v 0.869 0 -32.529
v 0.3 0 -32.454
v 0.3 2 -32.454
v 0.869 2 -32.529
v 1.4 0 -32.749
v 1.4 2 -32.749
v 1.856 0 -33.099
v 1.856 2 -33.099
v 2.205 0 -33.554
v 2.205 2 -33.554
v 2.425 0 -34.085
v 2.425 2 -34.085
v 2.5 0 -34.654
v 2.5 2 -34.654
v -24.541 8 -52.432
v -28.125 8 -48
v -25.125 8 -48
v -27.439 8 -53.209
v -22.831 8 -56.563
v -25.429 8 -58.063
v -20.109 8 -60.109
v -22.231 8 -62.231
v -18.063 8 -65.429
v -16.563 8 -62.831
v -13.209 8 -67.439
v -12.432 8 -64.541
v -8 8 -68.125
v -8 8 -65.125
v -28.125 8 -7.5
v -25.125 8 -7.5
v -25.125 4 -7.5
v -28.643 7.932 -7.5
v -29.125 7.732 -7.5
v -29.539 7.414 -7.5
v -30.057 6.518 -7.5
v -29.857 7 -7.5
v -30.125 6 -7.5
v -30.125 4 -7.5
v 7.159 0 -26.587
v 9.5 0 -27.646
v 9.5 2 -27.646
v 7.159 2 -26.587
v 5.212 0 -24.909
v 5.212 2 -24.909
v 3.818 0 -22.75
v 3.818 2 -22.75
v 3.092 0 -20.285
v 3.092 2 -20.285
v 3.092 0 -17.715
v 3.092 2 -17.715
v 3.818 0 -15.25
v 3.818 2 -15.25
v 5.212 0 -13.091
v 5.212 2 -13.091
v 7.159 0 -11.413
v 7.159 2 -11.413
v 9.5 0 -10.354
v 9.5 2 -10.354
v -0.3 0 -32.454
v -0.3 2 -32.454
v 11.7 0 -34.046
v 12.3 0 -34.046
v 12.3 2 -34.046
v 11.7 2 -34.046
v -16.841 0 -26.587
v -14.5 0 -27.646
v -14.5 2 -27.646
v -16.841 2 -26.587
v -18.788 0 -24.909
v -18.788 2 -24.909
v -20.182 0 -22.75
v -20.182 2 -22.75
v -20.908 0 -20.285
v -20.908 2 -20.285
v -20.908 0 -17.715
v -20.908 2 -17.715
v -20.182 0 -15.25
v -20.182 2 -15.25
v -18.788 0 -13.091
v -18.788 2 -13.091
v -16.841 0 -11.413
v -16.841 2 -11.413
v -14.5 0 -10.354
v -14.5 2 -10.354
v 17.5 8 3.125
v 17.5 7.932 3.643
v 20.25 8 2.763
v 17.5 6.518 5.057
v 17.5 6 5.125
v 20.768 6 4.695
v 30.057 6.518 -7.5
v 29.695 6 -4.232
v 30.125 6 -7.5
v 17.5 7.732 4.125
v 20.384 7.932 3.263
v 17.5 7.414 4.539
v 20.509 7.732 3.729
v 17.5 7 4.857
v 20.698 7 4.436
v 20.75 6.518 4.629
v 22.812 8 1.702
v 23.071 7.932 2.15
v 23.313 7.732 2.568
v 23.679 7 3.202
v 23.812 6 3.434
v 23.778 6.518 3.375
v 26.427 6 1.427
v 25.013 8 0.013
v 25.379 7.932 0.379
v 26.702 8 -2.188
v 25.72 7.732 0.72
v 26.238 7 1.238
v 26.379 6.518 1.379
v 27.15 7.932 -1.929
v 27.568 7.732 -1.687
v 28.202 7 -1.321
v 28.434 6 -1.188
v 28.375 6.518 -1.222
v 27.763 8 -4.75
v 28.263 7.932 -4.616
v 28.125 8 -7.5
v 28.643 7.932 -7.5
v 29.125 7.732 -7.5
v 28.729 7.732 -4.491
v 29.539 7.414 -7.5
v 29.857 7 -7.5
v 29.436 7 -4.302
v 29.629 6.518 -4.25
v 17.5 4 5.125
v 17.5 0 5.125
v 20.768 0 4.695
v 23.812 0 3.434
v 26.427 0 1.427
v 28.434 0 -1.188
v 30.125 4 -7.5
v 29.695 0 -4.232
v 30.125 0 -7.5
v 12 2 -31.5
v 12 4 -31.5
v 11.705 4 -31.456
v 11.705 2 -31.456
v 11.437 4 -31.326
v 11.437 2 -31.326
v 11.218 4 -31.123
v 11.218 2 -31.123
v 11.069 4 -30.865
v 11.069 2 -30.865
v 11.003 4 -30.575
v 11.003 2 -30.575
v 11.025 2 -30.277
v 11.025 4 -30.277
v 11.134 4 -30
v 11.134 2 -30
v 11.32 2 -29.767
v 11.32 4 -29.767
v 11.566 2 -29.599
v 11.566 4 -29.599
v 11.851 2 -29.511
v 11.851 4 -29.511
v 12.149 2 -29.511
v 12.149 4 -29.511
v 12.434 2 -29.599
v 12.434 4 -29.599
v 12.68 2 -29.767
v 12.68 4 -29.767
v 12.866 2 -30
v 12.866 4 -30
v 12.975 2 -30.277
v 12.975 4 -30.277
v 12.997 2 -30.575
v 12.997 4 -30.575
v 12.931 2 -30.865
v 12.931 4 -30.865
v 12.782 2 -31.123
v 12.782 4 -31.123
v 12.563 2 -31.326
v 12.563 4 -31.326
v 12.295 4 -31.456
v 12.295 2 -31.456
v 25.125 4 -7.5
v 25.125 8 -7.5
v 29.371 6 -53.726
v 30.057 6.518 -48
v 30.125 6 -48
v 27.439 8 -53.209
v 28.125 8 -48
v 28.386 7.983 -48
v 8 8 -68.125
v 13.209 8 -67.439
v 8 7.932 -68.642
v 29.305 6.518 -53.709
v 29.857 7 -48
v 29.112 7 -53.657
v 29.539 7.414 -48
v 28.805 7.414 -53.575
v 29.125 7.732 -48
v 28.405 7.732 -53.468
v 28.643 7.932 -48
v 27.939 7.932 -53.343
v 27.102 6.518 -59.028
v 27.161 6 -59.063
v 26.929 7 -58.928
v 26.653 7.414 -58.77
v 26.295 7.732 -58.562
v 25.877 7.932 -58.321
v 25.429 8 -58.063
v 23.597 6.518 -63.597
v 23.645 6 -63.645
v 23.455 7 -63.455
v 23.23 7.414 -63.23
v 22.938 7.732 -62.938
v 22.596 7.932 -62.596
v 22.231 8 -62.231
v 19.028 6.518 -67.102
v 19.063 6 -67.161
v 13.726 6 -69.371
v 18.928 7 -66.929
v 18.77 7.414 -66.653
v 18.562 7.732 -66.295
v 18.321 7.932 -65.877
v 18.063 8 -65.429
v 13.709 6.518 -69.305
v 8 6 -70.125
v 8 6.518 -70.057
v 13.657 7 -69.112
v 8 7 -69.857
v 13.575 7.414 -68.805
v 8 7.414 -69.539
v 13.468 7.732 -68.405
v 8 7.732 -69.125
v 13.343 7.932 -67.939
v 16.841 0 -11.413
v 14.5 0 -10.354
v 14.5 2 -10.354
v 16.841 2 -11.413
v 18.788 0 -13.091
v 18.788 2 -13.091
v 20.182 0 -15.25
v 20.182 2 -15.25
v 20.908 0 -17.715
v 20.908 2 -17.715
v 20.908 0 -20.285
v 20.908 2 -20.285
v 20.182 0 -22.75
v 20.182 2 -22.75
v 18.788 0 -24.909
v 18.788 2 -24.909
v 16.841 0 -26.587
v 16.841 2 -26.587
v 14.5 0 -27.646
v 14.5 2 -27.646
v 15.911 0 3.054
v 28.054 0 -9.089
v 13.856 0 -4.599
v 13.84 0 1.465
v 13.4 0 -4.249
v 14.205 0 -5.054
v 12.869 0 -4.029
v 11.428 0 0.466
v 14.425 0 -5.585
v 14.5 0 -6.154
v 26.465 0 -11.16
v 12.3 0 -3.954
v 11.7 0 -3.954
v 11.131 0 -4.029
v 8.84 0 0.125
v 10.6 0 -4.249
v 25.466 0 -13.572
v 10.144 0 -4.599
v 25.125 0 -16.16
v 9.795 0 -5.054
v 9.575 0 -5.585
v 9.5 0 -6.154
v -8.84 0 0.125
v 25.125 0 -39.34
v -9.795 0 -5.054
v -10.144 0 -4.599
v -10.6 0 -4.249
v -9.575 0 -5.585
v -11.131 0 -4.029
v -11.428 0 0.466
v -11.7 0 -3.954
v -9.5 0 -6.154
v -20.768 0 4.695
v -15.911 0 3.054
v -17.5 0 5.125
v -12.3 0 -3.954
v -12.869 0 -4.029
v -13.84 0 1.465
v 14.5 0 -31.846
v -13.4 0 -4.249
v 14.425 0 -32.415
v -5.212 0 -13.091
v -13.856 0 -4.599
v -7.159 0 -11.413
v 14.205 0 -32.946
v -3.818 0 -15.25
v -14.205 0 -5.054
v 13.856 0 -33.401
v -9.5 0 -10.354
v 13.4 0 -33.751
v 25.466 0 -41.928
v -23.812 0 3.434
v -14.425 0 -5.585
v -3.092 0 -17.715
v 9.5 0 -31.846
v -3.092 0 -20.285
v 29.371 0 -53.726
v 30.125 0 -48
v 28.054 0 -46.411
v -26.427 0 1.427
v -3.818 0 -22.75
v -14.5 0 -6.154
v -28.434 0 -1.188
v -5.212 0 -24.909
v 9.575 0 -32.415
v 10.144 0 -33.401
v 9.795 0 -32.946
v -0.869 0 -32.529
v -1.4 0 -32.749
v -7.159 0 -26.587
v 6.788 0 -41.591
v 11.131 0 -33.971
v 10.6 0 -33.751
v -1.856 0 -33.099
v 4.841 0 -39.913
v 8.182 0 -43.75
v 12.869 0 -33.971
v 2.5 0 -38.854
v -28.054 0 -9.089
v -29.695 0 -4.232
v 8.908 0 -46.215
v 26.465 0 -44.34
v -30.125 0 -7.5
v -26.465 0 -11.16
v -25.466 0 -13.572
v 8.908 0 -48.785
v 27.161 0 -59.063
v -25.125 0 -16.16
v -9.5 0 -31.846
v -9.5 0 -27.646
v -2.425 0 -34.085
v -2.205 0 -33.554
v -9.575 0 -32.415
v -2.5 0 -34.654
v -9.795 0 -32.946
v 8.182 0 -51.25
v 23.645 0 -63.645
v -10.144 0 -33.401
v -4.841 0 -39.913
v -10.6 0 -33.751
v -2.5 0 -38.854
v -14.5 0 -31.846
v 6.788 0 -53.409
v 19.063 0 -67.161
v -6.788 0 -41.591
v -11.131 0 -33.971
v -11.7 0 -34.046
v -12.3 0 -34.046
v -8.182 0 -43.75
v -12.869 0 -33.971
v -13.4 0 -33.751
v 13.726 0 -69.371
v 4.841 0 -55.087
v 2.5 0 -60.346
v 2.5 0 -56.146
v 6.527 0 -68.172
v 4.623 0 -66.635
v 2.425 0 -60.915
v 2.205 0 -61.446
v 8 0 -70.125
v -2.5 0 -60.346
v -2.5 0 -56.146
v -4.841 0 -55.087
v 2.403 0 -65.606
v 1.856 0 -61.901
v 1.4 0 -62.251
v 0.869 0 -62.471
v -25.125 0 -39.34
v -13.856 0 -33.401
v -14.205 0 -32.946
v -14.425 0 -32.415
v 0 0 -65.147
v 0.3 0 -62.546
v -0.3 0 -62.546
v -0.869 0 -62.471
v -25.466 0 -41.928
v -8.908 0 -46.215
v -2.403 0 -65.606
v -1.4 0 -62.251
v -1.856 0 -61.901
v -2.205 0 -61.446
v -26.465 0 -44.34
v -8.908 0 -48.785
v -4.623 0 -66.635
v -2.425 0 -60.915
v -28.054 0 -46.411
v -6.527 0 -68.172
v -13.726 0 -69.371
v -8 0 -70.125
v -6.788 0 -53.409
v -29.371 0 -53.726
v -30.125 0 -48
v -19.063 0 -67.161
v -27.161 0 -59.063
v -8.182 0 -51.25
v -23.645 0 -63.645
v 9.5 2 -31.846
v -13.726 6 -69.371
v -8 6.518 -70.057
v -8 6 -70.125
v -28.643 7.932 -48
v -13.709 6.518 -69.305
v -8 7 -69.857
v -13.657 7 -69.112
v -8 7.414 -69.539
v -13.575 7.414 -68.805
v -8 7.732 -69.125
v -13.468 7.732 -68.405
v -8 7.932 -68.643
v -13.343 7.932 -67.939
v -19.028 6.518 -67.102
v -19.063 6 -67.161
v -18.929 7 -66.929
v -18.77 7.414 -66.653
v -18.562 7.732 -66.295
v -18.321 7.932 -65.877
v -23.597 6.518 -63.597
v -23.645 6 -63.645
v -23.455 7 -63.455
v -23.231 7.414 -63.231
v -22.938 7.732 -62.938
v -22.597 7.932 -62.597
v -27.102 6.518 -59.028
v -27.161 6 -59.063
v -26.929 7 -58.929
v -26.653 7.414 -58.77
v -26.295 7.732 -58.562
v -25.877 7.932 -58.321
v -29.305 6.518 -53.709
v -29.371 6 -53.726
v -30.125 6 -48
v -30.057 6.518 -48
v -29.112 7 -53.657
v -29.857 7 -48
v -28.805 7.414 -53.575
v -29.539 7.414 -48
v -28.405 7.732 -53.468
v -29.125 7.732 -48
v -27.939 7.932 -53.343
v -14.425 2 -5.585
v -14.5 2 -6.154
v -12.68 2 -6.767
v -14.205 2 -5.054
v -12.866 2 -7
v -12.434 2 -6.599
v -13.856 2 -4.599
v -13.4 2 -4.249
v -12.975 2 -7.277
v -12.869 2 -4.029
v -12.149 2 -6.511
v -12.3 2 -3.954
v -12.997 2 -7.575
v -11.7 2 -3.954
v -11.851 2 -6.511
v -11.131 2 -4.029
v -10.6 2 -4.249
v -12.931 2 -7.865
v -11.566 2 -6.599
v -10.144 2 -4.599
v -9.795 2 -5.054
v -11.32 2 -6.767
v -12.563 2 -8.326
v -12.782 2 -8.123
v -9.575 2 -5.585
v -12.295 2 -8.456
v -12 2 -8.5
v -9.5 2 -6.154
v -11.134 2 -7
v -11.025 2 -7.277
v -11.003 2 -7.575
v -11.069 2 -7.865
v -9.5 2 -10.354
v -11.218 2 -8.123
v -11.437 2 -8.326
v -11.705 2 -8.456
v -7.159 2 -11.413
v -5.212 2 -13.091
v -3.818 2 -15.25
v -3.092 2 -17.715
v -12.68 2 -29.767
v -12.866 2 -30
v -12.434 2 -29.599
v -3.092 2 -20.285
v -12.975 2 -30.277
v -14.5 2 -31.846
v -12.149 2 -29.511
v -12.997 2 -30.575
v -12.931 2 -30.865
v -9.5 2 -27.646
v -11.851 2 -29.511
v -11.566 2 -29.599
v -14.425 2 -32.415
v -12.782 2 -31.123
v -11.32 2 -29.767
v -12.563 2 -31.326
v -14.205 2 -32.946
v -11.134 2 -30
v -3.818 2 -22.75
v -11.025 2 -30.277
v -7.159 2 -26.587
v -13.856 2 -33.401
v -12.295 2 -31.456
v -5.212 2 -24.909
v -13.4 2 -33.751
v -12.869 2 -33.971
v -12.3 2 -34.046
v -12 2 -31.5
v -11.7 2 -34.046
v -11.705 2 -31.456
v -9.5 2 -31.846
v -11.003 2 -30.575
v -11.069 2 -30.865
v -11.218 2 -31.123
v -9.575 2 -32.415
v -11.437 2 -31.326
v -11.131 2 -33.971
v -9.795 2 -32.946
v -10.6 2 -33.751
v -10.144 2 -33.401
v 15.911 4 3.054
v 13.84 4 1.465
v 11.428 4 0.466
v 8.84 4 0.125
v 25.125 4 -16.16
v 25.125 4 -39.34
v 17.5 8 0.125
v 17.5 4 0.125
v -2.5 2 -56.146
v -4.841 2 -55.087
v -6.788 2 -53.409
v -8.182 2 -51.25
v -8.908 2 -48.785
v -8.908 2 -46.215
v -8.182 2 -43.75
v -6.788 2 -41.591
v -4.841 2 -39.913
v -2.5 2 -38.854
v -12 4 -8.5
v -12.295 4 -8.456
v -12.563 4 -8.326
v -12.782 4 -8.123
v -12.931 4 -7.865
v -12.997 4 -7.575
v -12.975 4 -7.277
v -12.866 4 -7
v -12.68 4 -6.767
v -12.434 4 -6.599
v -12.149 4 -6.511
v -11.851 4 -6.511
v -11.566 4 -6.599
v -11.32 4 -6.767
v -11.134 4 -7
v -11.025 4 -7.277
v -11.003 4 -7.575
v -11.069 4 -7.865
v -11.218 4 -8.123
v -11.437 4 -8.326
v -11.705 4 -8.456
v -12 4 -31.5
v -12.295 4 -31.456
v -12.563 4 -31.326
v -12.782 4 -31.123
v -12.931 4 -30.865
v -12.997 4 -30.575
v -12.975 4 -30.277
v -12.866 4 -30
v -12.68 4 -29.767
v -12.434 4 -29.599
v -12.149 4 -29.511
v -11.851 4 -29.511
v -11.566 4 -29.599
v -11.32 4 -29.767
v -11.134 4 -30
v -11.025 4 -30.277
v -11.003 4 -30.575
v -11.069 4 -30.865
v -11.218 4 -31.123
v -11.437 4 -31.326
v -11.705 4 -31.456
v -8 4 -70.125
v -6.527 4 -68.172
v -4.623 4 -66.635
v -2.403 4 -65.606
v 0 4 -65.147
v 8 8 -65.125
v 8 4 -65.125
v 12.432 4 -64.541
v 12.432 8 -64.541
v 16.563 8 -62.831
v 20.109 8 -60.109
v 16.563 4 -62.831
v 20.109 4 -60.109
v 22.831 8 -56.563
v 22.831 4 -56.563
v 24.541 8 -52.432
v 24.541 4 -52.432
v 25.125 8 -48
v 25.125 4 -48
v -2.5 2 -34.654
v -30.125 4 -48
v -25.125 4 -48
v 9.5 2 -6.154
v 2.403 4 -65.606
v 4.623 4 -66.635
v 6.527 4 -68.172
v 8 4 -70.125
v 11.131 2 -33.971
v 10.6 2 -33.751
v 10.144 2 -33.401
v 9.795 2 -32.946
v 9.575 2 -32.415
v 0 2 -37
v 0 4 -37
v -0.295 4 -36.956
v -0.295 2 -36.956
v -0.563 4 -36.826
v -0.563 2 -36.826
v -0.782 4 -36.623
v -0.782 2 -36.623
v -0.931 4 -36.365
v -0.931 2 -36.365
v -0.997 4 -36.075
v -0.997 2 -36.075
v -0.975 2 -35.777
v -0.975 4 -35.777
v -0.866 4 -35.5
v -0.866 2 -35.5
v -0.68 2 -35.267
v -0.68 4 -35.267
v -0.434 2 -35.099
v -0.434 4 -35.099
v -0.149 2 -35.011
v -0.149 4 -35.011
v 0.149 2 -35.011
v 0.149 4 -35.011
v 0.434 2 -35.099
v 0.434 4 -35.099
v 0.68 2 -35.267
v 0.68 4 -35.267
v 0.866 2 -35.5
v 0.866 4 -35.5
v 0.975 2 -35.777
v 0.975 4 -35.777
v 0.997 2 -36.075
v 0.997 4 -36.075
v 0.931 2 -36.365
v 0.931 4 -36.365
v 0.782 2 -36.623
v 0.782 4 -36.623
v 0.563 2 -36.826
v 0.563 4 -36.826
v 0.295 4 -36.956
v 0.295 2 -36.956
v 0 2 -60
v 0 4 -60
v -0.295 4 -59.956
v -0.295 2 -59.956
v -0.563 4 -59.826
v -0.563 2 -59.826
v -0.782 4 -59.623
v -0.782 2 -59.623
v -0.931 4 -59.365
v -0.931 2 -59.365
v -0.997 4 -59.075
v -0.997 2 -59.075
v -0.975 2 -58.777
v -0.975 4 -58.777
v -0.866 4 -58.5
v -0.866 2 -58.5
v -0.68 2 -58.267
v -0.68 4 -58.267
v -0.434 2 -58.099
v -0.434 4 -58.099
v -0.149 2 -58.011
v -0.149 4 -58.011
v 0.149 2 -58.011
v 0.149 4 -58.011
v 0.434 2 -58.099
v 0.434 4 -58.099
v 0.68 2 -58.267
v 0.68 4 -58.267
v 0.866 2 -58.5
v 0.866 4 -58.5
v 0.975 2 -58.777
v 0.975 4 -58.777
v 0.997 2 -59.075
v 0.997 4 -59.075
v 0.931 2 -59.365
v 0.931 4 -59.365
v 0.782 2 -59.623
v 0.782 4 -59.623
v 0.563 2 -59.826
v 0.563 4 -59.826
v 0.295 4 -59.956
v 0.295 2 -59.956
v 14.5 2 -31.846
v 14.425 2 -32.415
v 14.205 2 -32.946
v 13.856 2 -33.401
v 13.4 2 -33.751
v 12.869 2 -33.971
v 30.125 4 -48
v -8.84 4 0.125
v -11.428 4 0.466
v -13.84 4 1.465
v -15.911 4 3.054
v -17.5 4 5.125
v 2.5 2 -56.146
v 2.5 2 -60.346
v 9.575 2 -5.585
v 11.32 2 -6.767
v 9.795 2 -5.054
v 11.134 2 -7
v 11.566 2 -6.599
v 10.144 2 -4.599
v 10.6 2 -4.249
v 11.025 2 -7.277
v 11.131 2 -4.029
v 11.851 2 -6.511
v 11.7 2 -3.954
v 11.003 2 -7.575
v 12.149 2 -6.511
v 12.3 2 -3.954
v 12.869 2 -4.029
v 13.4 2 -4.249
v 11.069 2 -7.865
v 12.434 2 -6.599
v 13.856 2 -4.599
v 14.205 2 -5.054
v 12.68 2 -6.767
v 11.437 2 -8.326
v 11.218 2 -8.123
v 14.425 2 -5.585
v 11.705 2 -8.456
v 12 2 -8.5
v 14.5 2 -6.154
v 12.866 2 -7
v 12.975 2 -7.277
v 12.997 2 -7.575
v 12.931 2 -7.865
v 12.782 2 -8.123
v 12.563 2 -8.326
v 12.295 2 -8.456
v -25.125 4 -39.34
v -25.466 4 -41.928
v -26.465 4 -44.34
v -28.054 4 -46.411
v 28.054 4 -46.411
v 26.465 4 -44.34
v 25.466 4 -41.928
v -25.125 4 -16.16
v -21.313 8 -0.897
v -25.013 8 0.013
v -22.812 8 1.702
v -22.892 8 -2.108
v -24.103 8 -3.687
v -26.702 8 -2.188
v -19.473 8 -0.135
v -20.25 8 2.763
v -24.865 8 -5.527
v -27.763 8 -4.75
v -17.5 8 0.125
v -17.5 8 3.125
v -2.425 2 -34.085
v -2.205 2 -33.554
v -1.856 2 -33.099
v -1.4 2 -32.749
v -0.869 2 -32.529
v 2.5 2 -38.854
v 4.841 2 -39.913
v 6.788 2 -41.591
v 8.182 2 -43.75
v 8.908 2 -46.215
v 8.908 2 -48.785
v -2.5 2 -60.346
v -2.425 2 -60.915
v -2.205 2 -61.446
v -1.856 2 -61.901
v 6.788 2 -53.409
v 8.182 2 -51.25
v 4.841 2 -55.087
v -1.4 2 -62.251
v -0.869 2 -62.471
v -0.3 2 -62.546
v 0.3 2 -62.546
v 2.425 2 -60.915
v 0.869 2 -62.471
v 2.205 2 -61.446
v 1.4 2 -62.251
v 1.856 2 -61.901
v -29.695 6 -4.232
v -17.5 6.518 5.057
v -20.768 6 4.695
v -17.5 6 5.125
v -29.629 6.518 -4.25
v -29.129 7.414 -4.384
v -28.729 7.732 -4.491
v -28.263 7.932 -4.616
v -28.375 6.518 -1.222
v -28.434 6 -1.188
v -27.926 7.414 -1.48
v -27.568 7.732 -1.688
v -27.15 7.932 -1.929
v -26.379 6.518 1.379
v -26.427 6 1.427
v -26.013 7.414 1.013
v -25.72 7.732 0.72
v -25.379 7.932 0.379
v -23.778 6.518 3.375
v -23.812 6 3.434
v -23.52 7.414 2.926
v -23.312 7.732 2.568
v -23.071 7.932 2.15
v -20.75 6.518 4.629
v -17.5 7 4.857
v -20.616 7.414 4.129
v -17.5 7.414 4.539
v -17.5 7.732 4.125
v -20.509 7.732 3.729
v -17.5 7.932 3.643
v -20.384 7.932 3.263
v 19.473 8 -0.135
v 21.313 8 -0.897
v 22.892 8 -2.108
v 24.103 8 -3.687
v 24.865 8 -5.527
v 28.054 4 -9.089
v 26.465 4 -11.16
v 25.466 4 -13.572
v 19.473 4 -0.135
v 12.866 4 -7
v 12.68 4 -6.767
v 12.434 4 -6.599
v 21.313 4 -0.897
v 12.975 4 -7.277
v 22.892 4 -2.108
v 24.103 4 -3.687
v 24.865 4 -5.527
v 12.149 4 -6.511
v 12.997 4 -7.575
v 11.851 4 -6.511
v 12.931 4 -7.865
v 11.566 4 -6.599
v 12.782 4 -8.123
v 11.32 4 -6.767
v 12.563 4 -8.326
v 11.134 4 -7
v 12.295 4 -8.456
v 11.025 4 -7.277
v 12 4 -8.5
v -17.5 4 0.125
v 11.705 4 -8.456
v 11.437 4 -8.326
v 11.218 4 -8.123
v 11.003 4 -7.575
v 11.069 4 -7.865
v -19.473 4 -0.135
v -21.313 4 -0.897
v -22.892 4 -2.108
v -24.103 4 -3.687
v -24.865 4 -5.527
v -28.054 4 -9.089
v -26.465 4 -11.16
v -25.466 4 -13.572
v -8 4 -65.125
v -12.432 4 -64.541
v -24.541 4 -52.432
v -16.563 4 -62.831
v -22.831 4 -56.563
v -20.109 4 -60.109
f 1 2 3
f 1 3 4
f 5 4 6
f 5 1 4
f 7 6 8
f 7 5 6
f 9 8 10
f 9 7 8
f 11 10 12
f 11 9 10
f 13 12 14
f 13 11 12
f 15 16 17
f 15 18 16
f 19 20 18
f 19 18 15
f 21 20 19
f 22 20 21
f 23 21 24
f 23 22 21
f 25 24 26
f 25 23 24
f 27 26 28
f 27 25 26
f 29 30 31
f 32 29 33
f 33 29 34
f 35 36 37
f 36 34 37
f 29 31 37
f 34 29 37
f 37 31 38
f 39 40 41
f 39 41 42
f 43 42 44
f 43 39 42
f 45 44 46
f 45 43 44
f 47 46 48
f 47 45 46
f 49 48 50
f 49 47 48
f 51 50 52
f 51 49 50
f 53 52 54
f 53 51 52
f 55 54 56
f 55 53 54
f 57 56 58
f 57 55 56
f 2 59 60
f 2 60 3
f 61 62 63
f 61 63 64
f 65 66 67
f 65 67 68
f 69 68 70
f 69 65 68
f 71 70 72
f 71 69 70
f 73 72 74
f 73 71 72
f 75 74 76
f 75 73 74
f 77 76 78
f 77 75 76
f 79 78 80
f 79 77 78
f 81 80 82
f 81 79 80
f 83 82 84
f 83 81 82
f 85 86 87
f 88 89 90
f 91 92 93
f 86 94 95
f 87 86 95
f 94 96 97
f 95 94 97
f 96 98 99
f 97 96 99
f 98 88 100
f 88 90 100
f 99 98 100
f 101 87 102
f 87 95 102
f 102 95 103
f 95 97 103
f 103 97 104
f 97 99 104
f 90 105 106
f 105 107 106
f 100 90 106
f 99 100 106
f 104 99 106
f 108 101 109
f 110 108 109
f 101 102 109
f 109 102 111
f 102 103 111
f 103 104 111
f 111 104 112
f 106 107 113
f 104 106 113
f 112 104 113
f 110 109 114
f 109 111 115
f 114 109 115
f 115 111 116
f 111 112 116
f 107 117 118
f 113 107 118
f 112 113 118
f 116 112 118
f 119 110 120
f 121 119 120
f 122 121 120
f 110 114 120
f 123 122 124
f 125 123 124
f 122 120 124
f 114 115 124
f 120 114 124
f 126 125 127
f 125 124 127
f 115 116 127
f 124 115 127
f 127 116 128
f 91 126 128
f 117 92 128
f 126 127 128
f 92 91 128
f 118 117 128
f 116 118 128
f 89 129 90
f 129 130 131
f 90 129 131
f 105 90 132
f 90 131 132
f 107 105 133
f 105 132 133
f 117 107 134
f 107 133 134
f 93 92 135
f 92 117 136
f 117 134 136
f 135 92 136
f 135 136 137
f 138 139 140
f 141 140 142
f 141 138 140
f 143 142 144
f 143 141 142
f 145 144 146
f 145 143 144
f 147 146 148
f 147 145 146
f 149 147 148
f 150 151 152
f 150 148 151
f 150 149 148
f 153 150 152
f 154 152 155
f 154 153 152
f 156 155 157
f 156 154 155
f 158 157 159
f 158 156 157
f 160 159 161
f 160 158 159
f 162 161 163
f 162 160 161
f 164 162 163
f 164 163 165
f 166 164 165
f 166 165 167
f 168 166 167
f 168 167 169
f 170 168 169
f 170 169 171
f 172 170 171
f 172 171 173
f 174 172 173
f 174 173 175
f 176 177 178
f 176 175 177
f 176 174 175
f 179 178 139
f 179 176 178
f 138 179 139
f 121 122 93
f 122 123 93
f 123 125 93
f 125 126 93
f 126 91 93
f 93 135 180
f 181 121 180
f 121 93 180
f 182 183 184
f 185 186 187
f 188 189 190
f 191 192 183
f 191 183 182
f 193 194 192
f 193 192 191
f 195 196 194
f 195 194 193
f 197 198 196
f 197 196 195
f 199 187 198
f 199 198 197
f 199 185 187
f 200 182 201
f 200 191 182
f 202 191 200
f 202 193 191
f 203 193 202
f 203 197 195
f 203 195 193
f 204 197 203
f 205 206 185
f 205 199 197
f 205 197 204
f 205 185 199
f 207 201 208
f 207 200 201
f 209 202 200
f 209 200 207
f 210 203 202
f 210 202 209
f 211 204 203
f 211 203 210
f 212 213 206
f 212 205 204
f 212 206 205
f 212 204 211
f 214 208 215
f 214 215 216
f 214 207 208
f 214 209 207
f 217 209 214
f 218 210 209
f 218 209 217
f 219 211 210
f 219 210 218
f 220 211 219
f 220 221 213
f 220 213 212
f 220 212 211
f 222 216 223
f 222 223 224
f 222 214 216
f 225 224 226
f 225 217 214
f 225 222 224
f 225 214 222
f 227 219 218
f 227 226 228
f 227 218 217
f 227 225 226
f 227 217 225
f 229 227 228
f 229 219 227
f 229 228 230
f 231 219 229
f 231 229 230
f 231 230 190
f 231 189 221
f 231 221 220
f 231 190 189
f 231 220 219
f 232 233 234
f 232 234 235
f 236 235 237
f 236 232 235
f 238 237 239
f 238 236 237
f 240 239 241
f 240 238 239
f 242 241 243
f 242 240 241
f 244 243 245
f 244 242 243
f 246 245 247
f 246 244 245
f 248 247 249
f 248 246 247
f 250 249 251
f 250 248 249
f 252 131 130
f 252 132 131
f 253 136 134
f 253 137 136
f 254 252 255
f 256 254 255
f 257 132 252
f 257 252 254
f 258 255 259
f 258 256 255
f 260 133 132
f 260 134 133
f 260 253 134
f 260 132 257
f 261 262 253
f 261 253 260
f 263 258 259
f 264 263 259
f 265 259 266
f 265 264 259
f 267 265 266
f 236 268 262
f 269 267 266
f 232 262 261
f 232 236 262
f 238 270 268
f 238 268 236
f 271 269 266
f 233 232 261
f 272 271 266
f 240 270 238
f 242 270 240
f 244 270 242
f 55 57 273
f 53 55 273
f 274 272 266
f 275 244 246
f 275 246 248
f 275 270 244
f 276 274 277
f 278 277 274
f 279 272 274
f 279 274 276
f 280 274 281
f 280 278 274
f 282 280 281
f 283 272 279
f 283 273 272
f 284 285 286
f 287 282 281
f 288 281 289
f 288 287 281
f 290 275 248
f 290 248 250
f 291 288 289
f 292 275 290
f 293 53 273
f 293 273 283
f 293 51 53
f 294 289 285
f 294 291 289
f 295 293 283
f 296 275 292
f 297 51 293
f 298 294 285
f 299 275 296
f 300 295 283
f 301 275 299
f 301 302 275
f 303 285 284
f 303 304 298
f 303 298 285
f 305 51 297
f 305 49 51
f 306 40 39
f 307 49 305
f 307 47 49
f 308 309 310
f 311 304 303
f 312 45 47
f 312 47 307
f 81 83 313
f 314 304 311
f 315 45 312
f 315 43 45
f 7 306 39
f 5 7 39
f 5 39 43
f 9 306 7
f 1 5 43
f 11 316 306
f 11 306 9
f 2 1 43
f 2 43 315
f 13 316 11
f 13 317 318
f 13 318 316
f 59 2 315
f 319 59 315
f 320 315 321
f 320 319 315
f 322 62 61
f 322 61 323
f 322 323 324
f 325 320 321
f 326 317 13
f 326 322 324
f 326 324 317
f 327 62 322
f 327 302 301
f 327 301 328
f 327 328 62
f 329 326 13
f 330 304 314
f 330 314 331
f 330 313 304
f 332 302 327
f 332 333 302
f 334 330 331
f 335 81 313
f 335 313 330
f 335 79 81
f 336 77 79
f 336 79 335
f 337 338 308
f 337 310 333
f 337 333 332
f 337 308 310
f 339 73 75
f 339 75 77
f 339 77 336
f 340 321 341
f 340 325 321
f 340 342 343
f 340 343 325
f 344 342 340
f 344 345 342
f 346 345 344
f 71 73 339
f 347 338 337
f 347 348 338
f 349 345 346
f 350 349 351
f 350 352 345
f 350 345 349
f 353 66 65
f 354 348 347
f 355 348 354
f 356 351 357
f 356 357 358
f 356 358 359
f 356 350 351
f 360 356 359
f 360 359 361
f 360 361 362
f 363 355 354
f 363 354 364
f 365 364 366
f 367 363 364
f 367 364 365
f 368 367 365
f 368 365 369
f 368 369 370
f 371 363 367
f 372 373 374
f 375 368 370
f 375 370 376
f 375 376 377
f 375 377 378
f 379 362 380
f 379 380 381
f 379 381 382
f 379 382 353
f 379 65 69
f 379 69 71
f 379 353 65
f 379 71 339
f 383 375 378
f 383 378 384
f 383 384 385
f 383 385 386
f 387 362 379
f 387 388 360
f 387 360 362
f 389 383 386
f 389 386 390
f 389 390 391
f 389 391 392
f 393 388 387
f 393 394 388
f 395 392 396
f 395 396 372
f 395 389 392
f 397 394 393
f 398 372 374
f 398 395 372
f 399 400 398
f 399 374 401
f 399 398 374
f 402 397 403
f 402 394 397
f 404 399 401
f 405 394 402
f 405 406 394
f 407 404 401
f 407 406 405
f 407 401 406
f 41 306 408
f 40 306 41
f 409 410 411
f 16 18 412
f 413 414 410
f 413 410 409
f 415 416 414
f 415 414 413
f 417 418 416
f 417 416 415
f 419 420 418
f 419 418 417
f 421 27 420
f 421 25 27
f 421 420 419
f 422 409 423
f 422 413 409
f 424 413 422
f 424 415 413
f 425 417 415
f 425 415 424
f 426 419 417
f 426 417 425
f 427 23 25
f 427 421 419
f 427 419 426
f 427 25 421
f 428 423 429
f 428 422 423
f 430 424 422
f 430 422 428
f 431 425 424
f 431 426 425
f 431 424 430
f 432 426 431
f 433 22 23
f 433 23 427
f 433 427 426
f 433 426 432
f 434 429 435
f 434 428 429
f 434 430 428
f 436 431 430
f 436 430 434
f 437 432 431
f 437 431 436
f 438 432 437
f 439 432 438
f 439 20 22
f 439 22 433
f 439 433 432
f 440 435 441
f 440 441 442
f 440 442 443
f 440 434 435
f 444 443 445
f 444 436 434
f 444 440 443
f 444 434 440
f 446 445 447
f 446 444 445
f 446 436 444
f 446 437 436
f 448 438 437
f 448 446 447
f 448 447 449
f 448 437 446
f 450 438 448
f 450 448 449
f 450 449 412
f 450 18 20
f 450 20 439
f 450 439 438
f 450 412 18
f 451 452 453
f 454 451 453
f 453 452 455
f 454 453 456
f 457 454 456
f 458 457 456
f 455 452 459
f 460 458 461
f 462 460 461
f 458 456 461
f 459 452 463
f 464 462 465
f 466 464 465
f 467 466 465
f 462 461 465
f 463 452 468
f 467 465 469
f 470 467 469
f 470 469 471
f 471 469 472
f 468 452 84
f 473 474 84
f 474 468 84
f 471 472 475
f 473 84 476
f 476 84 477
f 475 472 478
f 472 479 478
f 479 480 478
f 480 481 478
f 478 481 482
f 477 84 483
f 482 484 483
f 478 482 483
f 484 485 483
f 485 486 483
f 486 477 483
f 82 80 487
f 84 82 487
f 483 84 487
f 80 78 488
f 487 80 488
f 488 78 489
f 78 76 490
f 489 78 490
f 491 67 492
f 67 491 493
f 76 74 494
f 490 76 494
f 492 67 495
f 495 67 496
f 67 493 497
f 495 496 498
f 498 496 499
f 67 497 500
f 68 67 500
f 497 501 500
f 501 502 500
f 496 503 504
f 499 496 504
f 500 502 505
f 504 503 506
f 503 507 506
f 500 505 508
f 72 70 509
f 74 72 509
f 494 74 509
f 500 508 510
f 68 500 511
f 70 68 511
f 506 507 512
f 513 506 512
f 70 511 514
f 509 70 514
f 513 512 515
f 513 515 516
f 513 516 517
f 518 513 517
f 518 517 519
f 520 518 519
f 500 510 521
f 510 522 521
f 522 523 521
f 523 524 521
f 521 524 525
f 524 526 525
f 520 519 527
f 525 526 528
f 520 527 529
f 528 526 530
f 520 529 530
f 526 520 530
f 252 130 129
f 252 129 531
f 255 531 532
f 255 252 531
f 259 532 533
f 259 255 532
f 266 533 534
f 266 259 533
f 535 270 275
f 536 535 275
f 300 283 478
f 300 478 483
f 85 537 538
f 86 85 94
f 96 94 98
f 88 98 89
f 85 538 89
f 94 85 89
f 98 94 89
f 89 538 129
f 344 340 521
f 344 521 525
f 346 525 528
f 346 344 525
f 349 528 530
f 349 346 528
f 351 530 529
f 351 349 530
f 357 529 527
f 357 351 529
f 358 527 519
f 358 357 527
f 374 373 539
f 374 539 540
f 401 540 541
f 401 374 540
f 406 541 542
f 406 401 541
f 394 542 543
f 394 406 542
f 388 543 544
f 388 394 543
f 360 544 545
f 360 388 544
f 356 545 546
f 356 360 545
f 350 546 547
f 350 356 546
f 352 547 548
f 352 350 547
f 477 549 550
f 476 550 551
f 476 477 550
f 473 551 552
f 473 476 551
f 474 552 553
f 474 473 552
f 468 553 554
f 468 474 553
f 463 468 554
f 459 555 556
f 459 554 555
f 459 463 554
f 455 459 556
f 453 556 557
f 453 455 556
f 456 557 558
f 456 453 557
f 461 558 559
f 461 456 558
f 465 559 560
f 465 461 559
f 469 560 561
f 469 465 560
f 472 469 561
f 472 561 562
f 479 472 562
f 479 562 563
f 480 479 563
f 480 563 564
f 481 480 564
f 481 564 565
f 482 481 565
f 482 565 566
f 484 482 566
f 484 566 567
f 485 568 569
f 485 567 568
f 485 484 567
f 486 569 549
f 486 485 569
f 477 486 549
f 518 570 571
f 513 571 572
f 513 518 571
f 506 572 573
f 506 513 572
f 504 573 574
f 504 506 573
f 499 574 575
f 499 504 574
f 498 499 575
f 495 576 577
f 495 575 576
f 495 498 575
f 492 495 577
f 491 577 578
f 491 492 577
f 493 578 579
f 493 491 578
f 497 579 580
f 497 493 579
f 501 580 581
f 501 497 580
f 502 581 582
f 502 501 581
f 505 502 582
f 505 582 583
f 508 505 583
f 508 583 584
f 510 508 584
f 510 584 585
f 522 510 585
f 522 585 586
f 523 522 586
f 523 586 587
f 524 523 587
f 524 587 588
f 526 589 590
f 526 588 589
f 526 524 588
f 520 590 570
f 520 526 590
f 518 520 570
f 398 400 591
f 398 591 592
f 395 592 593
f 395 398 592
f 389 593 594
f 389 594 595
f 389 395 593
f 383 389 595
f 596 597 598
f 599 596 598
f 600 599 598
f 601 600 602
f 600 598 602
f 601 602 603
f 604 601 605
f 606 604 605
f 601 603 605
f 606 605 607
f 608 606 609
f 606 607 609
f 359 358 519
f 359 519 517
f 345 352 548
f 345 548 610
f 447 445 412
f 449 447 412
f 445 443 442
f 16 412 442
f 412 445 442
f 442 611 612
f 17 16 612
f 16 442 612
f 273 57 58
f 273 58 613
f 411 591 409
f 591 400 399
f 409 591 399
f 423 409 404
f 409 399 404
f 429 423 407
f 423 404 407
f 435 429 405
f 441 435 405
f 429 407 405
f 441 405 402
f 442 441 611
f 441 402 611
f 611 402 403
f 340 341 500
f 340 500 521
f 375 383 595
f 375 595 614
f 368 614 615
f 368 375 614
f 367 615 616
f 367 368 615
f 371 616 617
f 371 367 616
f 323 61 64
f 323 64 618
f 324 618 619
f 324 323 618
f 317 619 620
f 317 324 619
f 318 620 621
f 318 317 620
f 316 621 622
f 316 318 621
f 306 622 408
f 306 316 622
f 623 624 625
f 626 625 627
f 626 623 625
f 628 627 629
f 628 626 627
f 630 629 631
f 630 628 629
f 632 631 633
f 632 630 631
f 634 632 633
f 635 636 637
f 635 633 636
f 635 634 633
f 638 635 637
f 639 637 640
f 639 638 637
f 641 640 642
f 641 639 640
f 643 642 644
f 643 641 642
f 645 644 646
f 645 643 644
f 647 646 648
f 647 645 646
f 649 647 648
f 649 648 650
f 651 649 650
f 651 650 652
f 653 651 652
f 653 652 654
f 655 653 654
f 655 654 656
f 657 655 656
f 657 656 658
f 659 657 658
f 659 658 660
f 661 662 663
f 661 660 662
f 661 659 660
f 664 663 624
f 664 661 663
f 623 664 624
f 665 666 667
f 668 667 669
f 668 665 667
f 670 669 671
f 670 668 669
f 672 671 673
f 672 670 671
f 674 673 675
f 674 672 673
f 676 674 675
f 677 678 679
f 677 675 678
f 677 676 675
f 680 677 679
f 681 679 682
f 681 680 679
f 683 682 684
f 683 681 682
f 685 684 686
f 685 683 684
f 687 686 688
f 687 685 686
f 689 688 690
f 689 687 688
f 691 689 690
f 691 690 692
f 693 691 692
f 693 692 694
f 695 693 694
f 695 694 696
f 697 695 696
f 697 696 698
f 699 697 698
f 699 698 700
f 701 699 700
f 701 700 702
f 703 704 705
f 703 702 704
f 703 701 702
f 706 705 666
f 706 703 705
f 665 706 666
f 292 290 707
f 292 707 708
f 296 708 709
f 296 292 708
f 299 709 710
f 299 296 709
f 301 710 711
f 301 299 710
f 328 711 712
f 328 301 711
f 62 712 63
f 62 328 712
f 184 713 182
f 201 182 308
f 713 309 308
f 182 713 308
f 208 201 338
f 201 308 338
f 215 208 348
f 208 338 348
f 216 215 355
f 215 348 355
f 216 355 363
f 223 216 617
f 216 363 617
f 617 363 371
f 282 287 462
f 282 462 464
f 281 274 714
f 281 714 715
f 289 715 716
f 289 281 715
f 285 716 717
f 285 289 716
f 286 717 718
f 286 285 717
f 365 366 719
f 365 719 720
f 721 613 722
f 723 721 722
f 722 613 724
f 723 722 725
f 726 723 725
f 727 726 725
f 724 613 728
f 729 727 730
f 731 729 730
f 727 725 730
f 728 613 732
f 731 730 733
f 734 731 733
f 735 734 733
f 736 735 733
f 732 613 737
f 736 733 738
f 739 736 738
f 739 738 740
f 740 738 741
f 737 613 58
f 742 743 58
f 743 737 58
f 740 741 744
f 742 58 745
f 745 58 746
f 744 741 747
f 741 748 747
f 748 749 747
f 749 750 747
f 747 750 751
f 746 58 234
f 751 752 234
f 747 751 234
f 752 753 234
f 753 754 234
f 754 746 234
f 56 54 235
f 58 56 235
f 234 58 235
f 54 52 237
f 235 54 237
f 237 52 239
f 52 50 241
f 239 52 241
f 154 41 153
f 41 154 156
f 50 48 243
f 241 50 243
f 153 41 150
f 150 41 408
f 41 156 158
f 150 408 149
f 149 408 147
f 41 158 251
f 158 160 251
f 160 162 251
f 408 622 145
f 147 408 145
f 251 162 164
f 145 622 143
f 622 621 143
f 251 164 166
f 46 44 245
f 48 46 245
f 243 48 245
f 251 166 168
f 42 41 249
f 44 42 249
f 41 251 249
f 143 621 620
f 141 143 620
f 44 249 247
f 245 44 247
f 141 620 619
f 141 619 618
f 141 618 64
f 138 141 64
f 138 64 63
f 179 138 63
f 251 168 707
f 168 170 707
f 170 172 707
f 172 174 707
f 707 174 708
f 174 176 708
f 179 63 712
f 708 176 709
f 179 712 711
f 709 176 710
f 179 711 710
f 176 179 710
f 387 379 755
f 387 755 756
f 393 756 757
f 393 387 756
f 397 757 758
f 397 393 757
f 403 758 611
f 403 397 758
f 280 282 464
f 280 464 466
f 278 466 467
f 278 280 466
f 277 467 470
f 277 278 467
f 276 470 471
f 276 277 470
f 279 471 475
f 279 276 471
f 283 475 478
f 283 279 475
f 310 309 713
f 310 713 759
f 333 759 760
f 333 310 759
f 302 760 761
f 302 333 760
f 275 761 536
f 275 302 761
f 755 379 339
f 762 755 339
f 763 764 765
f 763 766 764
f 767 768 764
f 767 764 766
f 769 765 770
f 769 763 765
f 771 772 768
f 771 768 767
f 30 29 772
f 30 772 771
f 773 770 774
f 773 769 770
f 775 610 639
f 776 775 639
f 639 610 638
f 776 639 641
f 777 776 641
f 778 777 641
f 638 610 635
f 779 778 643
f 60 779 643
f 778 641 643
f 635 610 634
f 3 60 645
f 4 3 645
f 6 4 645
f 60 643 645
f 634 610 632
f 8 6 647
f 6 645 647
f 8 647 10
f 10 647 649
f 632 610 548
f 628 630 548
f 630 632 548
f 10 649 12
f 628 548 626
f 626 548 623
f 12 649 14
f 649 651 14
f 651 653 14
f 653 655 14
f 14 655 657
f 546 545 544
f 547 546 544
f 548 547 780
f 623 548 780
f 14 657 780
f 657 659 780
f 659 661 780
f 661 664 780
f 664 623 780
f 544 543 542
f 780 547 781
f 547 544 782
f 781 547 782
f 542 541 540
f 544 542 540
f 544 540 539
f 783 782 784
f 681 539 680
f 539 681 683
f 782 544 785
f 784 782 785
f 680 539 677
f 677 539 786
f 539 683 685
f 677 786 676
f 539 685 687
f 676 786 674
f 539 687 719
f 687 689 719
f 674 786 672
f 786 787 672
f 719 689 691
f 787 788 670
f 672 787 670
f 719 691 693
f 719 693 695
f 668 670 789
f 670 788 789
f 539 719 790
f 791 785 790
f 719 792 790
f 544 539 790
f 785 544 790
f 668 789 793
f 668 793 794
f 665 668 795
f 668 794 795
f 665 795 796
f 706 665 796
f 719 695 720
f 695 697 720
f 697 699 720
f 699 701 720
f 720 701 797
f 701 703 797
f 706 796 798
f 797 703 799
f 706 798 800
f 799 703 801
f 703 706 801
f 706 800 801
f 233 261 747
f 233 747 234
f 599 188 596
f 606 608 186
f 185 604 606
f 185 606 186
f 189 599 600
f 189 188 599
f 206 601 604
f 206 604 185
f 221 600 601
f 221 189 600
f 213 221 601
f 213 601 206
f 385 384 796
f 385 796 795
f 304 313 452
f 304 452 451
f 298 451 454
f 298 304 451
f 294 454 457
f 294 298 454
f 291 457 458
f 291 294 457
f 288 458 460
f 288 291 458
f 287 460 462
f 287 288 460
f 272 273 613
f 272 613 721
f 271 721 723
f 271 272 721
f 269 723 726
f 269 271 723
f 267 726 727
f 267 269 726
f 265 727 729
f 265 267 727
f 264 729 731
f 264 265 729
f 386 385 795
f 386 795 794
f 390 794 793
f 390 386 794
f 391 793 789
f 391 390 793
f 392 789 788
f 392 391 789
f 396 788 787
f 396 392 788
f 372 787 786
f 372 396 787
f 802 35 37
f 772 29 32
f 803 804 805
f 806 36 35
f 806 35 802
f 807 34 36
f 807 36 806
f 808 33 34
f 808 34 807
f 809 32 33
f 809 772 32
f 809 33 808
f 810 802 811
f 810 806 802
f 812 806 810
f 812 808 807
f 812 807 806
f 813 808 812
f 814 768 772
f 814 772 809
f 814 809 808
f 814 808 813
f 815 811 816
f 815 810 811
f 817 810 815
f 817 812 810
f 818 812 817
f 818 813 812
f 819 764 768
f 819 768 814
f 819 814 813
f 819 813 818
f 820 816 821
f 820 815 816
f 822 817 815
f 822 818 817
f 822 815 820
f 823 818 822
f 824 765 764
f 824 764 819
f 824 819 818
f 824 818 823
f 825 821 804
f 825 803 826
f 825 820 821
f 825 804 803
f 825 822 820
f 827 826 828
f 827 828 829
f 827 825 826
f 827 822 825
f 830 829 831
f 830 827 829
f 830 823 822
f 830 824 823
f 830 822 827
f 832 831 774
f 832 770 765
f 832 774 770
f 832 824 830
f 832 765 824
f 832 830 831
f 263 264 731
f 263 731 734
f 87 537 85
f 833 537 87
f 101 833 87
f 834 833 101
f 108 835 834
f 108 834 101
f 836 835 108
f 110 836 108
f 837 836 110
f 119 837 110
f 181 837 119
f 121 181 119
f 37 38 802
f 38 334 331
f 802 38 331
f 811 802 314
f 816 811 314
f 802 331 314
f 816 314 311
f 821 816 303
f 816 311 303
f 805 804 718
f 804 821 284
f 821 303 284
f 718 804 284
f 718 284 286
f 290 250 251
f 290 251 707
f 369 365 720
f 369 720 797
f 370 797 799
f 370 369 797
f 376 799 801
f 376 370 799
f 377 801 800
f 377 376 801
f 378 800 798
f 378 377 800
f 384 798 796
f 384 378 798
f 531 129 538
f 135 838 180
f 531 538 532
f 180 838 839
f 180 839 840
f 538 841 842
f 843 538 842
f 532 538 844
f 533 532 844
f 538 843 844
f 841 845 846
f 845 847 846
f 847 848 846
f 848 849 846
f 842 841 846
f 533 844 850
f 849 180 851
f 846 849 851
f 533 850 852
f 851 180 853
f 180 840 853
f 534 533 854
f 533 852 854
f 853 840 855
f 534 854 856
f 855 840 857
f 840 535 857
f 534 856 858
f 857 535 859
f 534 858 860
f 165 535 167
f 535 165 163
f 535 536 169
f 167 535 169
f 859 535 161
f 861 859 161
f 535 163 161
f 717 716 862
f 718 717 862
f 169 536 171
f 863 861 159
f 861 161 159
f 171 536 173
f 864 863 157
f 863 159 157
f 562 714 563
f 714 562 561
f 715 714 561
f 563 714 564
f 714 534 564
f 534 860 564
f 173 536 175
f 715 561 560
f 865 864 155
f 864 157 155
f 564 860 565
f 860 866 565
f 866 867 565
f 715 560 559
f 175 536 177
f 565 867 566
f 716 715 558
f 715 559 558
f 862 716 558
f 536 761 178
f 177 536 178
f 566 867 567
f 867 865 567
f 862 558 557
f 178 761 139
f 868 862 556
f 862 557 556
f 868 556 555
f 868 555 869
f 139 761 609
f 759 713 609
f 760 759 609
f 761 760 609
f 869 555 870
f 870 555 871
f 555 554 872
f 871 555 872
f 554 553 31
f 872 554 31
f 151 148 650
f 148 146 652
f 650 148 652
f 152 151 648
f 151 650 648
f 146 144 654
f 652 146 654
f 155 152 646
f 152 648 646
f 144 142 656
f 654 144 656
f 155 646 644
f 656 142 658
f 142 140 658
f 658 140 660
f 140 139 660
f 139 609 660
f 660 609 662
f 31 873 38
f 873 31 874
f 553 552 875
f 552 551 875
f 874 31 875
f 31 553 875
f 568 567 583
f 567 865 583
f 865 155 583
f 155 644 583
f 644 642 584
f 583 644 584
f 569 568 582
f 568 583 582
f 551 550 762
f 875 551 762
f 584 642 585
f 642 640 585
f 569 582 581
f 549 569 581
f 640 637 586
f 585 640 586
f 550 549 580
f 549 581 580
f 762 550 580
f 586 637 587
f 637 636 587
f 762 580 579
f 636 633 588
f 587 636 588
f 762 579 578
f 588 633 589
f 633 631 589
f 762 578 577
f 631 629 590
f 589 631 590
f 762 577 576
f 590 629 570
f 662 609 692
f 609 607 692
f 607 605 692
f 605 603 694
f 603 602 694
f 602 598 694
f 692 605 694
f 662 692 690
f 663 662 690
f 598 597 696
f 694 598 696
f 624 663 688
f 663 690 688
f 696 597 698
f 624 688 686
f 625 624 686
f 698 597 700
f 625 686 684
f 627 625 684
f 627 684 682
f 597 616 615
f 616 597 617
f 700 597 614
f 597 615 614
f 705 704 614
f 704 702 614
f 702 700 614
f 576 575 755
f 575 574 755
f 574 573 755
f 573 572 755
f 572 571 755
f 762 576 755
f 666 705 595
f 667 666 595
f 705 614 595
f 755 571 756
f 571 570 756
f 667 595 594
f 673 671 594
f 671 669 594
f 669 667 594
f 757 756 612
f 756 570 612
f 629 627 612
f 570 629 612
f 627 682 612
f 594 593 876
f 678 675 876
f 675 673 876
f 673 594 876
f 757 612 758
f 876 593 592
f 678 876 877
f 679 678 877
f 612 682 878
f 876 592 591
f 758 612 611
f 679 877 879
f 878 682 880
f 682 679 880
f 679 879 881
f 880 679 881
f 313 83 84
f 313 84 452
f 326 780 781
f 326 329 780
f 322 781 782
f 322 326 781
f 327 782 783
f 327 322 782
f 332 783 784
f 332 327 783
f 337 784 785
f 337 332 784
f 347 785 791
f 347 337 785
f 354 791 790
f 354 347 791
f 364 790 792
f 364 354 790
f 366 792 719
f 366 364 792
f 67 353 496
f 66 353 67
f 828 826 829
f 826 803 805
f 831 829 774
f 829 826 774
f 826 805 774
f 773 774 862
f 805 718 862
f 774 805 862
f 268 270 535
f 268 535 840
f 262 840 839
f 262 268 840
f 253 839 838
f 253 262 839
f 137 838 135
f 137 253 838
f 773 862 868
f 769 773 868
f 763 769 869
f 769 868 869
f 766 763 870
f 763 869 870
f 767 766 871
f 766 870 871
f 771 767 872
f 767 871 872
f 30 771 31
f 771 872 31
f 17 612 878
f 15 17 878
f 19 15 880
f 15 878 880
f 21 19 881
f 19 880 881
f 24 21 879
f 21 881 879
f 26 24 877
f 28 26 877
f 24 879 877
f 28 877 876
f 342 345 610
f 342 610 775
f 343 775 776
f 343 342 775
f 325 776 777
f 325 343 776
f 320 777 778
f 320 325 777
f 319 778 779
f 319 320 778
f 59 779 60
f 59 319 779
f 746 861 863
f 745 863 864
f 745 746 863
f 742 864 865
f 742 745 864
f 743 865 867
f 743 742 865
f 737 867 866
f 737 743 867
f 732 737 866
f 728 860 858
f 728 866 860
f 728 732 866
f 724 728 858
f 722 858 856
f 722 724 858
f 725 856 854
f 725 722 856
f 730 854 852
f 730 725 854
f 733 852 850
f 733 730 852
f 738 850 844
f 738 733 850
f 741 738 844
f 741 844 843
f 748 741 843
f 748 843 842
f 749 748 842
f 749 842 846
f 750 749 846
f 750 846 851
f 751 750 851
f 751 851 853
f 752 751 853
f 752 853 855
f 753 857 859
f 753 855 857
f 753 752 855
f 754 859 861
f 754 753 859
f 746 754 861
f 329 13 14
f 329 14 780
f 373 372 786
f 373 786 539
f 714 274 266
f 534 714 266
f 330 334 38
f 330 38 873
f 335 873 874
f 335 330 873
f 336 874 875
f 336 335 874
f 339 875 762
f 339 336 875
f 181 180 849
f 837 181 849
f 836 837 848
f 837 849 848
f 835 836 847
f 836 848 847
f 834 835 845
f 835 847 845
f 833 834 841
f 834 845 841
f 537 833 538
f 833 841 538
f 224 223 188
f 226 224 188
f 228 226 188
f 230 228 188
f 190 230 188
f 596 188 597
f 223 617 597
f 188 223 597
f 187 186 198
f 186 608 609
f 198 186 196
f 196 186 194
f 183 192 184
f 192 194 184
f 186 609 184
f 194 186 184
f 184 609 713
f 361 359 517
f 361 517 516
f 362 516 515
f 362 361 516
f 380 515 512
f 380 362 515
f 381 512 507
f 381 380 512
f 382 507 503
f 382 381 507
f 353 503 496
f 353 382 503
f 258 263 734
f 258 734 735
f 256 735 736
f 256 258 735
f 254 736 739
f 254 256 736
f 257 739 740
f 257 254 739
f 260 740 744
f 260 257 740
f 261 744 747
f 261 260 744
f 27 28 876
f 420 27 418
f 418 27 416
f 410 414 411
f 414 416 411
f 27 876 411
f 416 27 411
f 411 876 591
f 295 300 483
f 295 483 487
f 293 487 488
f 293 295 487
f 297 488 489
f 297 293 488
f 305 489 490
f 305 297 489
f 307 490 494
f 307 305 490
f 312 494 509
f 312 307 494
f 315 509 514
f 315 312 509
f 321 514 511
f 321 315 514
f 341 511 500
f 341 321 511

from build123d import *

# Parameters (mm, degrees)
SALIENTE_EXTRUIR1_DEPTH = 4
SALIENTE_EXTRUIR2_START = 4
SALIENTE_EXTRUIR2_DEPTH = 4
REDONDEO1_R             = 10
REDONDEO3_R             = 2
CROQUIS3_R              = 1
CROQUIS3_R_2            = 9
CORTAR_EXTRUIR1_DEPTH   = 2
CROQUIS3_3_R            = 1
CORTAR_EXTRUIR2_DEPTH   = 77.740023923


with BuildPart() as part:
    # Croquis1 → Saliente-Extruir1 (new body)
    with BuildSketch(Plane(origin=(0, 0, 0), x_dir=(1, 0, 0), z_dir=(0, 1, 0))):
        with BuildLine():
            Line((30.125, 7.5), (25.125, 7.5))
            Line((25.125, 7.5), (25.125, 48))
            Line((25.125, 48), (30.125, 48))
            ThreePointArc((30.125, 48), (23.644737534, 63.644737534), (8, 70.125))
            Line((8, 70.125), (8, 65.125))
            Line((8, 65.125), (-8, 65.125))
            Line((-8, 65.125), (-8, 70.125))
            ThreePointArc((-8, 70.125), (-23.644737534, 63.644737534), (-30.125, 48))
            Line((-30.125, 48), (-25.125, 48))
            Line((-25.125, 48), (-25.125, 7.5))
            Line((-25.125, 7.5), (-30.125, 7.5))
            ThreePointArc((-30.125, 7.5), (-26.427223112, -1.427223112), (-17.5, -5.125))
            Line((-17.5, -5.125), (-17.5, -0.125))
            Line((-17.5, -0.125), (17.5, -0.125))
            Line((17.5, -0.125), (17.5, -5.125))
            ThreePointArc((17.5, -5.125), (26.427223112, -1.427223112), (30.125, 7.5))
        make_face()
    extrude(amount=SALIENTE_EXTRUIR1_DEPTH)

    # Croquis1<3> → Saliente-Extruir2 (add)
    with BuildSketch(Plane(origin=(0, 0, 0), x_dir=(1, 0, 0), z_dir=(0, 1, 0)).offset(SALIENTE_EXTRUIR2_START)):
        with BuildLine():
            Line((-30.125, 48), (-25.125, 48))
            ThreePointArc((-25.125, 48), (-20.109203628, 60.109203628), (-8, 65.125))
            Line((-8, 65.125), (-8, 70.125))
            ThreePointArc((-8, 70.125), (-23.644737534, 63.644737534), (-30.125, 48))
        make_face()
        with BuildLine():
            Line((-17.5, -5.125), (-17.5, -0.125))
            ThreePointArc((-17.5, -0.125), (-22.891689207, 2.108310793), (-25.125, 7.5))
            Line((-25.125, 7.5), (-30.125, 7.5))
            ThreePointArc((-30.125, 7.5), (-26.427223112, -1.427223112), (-17.5, -5.125))
        make_face()
        with BuildLine():
            ThreePointArc((25.125, 7.5), (22.891689207, 2.108310793), (17.5, -0.125))
            Line((17.5, -0.125), (17.5, -5.125))
            ThreePointArc((17.5, -5.125), (26.427223112, -1.427223112), (30.125, 7.5))
            Line((30.125, 7.5), (25.125, 7.5))
        make_face()
        with BuildLine():
            ThreePointArc((8, 65.125), (20.109203628, 60.109203628), (25.125, 48))
            Line((25.125, 48), (30.125, 48))
            ThreePointArc((30.125, 48), (23.644737534, 63.644737534), (8, 70.125))
            Line((8, 70.125), (8, 65.125))
        make_face()
    extrude(amount=SALIENTE_EXTRUIR2_DEPTH)

    # Redondeo1
    # the kernel refuses this fillet: 10 mm, written as the material it adds along each edge
    with BuildSketch(Plane(origin=(8, 0, -65.125), x_dir=(-1, 0, 0), z_dir=(0, 1, 0)), Plane(origin=(-17.5, 0, 0.125), x_dir=(1, 0, 0), z_dir=(0, 1, 0)), Plane(origin=(-25.125, 0, -48), x_dir=(0, 0, 1), z_dir=(0, 1, 0))) as redondeo1_piece_1:
        with BuildLine():
            CenterArc((8.660254038, -10), REDONDEO1_R, 90, 60)
            Line((0, -5), (-0.173205081, -4.9))
            ThreePointArc((-0.173205081, -4.9), (-0.2, -2.5), (-0.2, 0))
            Line((-0.2, 0), (0, 0.2))
            Line((0, 0.2), (8.660254038, 0.2))
            Line((8.660254038, 0.2), (8.660254038, 0))
        make_face()
    extrude(amount=4)
    with BuildSketch(Plane(origin=(-8, 0, -65.125), x_dir=(0, 0, -1), z_dir=(0, 1, 0)), Plane(origin=(17.5, 0, 0.125), x_dir=(0, 0, 1), z_dir=(0, 1, 0)), Plane(origin=(25.125, 0, -48), x_dir=(1, 0, 0), z_dir=(0, 1, 0)), Plane(origin=(-25.125, 0, -7.5), x_dir=(-1, 0, 0), z_dir=(0, 1, 0))) as redondeo1_piece_2:
        with BuildLine():
            CenterArc((10, -8.660254038), REDONDEO1_R, 120, 60)
            Line((0, -8.660254038), (-0.2, -8.660254038))
            Line((-0.2, -8.660254038), (-0.2, 0))
            Line((-0.2, 0), (0, 0.2))
            ThreePointArc((0, 0.2), (2.5, 0.2), (4.9, 0.173205081))
            Line((4.9, 0.173205081), (5, 0))
        make_face()
    extrude(amount=4)
    with BuildSketch(Plane(origin=(25.125, 0, -7.5), x_dir=(1, 0, 0), z_dir=(0, 1, 0))) as redondeo1_piece_3:
        with BuildLine():
            CenterArc((10, 8.660254038), REDONDEO1_R, 180, 60)
            Line((0, 8.660254038), (-0.2, 8.660254038))
            Line((-0.2, 8.660254038), (-0.2, 0))
            Line((-0.2, 0), (0, -0.2))
            ThreePointArc((0, -0.2), (2.5, -0.2), (4.9, -0.173205081))
            Line((4.9, -0.173205081), (5, 0))
        make_face()
    extrude(amount=4)

    # Redondeo3
    redondeo3_edges = [part.edges().sort_by_distance(p)[0] for p in [
        (-23.644737534, 8, -63.644737534),
        (-26.427223112, 8, 1.427223112),
        (26.427223112, 8, 1.427223112),
        (23.644737534, 8, -63.644737534),
    ]]
    fillet(redondeo3_edges, radius=REDONDEO3_R)

    # Croquis3 → Cortar-Extruir1 (cut)
    # profile 1 of 5: a face of its own
    with BuildSketch(Plane(origin=(0, 0, 0), x_dir=(1, 0, 0), z_dir=(0, 1, 0))):
        with BuildLine():
            ThreePointArc((-9.5, 10.354191767), (-3, 19), (-9.5, 27.645808233))
            Line((-9.5, 27.645808233), (-9.5, 31.845808233))
            ThreePointArc((-9.5, 31.845808233), (-10.144365081, 33.401443152), (-11.7, 34.045808233))
            Line((-11.7, 34.045808233), (-12.3, 34.045808233))
            ThreePointArc((-12.3, 34.045808233), (-13.855634919, 33.401443152), (-14.5, 31.845808233))
            Line((-14.5, 31.845808233), (-14.5, 27.645808233))
            ThreePointArc((-14.5, 27.645808233), (-21, 19), (-14.5, 10.354191767))
            Line((-14.5, 10.354191767), (-14.5, 6.154191767))
            ThreePointArc((-14.5, 6.154191767), (-13.855634919, 4.598556848), (-12.3, 3.954191767))
            Line((-12.3, 3.954191767), (-11.7, 3.954191767))
            ThreePointArc((-11.7, 3.954191767), (-10.144365081, 4.598556848), (-9.5, 6.154191767))
            Line((-9.5, 6.154191767), (-9.5, 10.354191767))
        make_face()
        with Locations(Location((-12, 7.5, 0), (0, 0, 90))):
            Circle(CROQUIS3_R, mode=Mode.SUBTRACT)
        with Locations(Location((-12, 30.5, 0), (0, 0, 90))):
            Circle(CROQUIS3_R, mode=Mode.SUBTRACT)
    # profile 2 of 5: a face of its own
    with BuildSketch(Plane(origin=(0, 0, 0), x_dir=(1, 0, 0), z_dir=(0, 1, 0))):
        with BuildLine():
            Line((14.5, 27.645808233), (14.5, 31.845808233))
            ThreePointArc((14.5, 31.845808233), (13.855634919, 33.401443152), (12.3, 34.045808233))
            Line((12.3, 34.045808233), (11.7, 34.045808233))
            ThreePointArc((11.7, 34.045808233), (10.144365081, 33.401443152), (9.5, 31.845808233))
            Line((9.5, 31.845808233), (9.5, 27.645808233))
            ThreePointArc((9.5, 27.645808233), (3, 19), (9.5, 10.354191767))
            Line((9.5, 10.354191767), (9.5, 6.154191767))
            ThreePointArc((9.5, 6.154191767), (10.144365081, 4.598556848), (11.7, 3.954191767))
            Line((11.7, 3.954191767), (12.3, 3.954191767))
            ThreePointArc((12.3, 3.954191767), (13.855634919, 4.598556848), (14.5, 6.154191767))
            Line((14.5, 6.154191767), (14.5, 10.354191767))
            ThreePointArc((14.5, 10.354191767), (21, 19), (14.5, 27.645808233))
        make_face()
        with Locations(Location((12, 7.5, 0), (0, 0, 90))):
            Circle(CROQUIS3_R, mode=Mode.SUBTRACT)
        with Locations(Location((12, 30.5, 0), (0, 0, 90))):
            Circle(CROQUIS3_R, mode=Mode.SUBTRACT)
    # profile 3 of 5: a face of its own
    with BuildSketch(Plane(origin=(0, 0, 0), x_dir=(1, 0, 0), z_dir=(0, 1, 0))):
        with Locations((0, 47.5)):
            Circle(CROQUIS3_R_2)
    # profile 4 of 5: a face of its own
    with BuildSketch(Plane(origin=(0, 0, 0), x_dir=(1, 0, 0), z_dir=(0, 1, 0))):
        with BuildLine():
            Line((2.5, 34.654191767), (2.5, 38.854191767))
            ThreePointArc((2.5, 38.854191767), (0, 38.5), (-2.5, 38.854191767))
            Line((-2.5, 38.854191767), (-2.5, 34.654191767))
            ThreePointArc((-2.5, 34.654191767), (-1.855634919, 33.098556848), (-0.3, 32.454191767))
            Line((-0.3, 32.454191767), (0.3, 32.454191767))
            ThreePointArc((0.3, 32.454191767), (1.855634919, 33.098556848), (2.5, 34.654191767))
        make_face()
        with Locations(Location((0, 36, 0), (0, 0, 90))):
            Circle(CROQUIS3_R, mode=Mode.SUBTRACT)
    # profile 5 of 5: a face of its own
    with BuildSketch(Plane(origin=(0, 0, 0), x_dir=(1, 0, 0), z_dir=(0, 1, 0))):
        with BuildLine():
            ThreePointArc((-2.5, 56.145808233), (0, 56.5), (2.5, 56.145808233))
            Line((2.5, 56.145808233), (2.5, 60.345808233))
            ThreePointArc((2.5, 60.345808233), (1.855634919, 61.901443152), (0.3, 62.545808233))
            Line((0.3, 62.545808233), (-0.3, 62.545808233))
            ThreePointArc((-0.3, 62.545808233), (-1.855634919, 61.901443152), (-2.5, 60.345808233))
            Line((-2.5, 60.345808233), (-2.5, 56.145808233))
        make_face()
        with Locations(Location((0, 59, 0), (0, 0, 90))):
            Circle(CROQUIS3_R, mode=Mode.SUBTRACT)
    extrude(amount=CORTAR_EXTRUIR1_DEPTH, mode=Mode.SUBTRACT)

    # Croquis3<3> → Cortar-Extruir2 (cut, through all)
    with BuildSketch(Plane(origin=(0, 0, 0), x_dir=(1, 0, 0), z_dir=(0, 1, 0))):
        with Locations(Location((-12, 7.5, 0), (0, 0, 90))):
            Circle(CROQUIS3_3_R)
        with Locations(Location((-12, 30.5, 0), (0, 0, 90))):
            Circle(CROQUIS3_3_R)
        with Locations(Location((12, 7.5, 0), (0, 0, 90))):
            Circle(CROQUIS3_3_R)
        with Locations(Location((12, 30.5, 0), (0, 0, 90))):
            Circle(CROQUIS3_3_R)
        with Locations(Location((0, 59, 0), (0, 0, 90))):
            Circle(CROQUIS3_3_R)
        with Locations(Location((0, 36, 0), (0, 0, 90))):
            Circle(CROQUIS3_3_R)
    extrude(amount=CORTAR_EXTRUIR2_DEPTH, mode=Mode.SUBTRACT)


solid = part.part
